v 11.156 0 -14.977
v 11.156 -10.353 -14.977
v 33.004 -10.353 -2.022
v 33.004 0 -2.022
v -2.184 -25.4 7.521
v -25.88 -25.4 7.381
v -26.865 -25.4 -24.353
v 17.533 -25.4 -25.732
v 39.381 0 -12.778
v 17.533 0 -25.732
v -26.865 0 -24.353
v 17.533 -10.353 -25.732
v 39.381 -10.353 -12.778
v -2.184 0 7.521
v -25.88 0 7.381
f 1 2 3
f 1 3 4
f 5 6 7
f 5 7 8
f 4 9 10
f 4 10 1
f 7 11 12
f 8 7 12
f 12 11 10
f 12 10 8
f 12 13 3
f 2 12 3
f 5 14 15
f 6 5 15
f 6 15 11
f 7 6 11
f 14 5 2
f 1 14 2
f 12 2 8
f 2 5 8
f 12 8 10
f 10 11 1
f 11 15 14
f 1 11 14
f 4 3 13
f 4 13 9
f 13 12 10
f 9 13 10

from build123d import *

# Parameters (mm, degrees)
F1_DEPTH = 25.4
F3_DEPTH = 25.4
F4_W     = 10.353053
F4_H     = 12.504167
F5_DEPTH = 25.4


with BuildPart() as f1:
    # F0 (on Front) → F1 (new body)
    with BuildSketch(Plane.XZ):
        Polygon((18.569692, 7.642571), (-25.87954, 7.38124), (-26.865089, -24.35346), (17.533206, -25.732289), align=None)
    extrude(amount=F1_DEPTH)

    # F2 (on face) → F3 (cut)
    with BuildSketch(Plane.XZ.offset(25.4)):
        Polygon((18.569692, 7.642571), (-2.184069, 7.520553), (17.533206, -25.732289), align=None)
    extrude(amount=-F3_DEPTH, mode=Mode.SUBTRACT)

    # F4 (on face) → F5 (join)
    with BuildSketch(Plane(origin=(1.683383, 0, 0.998162), x_dir=(0, 1, 0), z_dir=(0.860157, 0, 0.51003))):
        with Locations((-5.176526, -24.824175)):
            Rectangle(F4_W, F4_H)
    extrude(amount=F5_DEPTH)


solid = f1.part
